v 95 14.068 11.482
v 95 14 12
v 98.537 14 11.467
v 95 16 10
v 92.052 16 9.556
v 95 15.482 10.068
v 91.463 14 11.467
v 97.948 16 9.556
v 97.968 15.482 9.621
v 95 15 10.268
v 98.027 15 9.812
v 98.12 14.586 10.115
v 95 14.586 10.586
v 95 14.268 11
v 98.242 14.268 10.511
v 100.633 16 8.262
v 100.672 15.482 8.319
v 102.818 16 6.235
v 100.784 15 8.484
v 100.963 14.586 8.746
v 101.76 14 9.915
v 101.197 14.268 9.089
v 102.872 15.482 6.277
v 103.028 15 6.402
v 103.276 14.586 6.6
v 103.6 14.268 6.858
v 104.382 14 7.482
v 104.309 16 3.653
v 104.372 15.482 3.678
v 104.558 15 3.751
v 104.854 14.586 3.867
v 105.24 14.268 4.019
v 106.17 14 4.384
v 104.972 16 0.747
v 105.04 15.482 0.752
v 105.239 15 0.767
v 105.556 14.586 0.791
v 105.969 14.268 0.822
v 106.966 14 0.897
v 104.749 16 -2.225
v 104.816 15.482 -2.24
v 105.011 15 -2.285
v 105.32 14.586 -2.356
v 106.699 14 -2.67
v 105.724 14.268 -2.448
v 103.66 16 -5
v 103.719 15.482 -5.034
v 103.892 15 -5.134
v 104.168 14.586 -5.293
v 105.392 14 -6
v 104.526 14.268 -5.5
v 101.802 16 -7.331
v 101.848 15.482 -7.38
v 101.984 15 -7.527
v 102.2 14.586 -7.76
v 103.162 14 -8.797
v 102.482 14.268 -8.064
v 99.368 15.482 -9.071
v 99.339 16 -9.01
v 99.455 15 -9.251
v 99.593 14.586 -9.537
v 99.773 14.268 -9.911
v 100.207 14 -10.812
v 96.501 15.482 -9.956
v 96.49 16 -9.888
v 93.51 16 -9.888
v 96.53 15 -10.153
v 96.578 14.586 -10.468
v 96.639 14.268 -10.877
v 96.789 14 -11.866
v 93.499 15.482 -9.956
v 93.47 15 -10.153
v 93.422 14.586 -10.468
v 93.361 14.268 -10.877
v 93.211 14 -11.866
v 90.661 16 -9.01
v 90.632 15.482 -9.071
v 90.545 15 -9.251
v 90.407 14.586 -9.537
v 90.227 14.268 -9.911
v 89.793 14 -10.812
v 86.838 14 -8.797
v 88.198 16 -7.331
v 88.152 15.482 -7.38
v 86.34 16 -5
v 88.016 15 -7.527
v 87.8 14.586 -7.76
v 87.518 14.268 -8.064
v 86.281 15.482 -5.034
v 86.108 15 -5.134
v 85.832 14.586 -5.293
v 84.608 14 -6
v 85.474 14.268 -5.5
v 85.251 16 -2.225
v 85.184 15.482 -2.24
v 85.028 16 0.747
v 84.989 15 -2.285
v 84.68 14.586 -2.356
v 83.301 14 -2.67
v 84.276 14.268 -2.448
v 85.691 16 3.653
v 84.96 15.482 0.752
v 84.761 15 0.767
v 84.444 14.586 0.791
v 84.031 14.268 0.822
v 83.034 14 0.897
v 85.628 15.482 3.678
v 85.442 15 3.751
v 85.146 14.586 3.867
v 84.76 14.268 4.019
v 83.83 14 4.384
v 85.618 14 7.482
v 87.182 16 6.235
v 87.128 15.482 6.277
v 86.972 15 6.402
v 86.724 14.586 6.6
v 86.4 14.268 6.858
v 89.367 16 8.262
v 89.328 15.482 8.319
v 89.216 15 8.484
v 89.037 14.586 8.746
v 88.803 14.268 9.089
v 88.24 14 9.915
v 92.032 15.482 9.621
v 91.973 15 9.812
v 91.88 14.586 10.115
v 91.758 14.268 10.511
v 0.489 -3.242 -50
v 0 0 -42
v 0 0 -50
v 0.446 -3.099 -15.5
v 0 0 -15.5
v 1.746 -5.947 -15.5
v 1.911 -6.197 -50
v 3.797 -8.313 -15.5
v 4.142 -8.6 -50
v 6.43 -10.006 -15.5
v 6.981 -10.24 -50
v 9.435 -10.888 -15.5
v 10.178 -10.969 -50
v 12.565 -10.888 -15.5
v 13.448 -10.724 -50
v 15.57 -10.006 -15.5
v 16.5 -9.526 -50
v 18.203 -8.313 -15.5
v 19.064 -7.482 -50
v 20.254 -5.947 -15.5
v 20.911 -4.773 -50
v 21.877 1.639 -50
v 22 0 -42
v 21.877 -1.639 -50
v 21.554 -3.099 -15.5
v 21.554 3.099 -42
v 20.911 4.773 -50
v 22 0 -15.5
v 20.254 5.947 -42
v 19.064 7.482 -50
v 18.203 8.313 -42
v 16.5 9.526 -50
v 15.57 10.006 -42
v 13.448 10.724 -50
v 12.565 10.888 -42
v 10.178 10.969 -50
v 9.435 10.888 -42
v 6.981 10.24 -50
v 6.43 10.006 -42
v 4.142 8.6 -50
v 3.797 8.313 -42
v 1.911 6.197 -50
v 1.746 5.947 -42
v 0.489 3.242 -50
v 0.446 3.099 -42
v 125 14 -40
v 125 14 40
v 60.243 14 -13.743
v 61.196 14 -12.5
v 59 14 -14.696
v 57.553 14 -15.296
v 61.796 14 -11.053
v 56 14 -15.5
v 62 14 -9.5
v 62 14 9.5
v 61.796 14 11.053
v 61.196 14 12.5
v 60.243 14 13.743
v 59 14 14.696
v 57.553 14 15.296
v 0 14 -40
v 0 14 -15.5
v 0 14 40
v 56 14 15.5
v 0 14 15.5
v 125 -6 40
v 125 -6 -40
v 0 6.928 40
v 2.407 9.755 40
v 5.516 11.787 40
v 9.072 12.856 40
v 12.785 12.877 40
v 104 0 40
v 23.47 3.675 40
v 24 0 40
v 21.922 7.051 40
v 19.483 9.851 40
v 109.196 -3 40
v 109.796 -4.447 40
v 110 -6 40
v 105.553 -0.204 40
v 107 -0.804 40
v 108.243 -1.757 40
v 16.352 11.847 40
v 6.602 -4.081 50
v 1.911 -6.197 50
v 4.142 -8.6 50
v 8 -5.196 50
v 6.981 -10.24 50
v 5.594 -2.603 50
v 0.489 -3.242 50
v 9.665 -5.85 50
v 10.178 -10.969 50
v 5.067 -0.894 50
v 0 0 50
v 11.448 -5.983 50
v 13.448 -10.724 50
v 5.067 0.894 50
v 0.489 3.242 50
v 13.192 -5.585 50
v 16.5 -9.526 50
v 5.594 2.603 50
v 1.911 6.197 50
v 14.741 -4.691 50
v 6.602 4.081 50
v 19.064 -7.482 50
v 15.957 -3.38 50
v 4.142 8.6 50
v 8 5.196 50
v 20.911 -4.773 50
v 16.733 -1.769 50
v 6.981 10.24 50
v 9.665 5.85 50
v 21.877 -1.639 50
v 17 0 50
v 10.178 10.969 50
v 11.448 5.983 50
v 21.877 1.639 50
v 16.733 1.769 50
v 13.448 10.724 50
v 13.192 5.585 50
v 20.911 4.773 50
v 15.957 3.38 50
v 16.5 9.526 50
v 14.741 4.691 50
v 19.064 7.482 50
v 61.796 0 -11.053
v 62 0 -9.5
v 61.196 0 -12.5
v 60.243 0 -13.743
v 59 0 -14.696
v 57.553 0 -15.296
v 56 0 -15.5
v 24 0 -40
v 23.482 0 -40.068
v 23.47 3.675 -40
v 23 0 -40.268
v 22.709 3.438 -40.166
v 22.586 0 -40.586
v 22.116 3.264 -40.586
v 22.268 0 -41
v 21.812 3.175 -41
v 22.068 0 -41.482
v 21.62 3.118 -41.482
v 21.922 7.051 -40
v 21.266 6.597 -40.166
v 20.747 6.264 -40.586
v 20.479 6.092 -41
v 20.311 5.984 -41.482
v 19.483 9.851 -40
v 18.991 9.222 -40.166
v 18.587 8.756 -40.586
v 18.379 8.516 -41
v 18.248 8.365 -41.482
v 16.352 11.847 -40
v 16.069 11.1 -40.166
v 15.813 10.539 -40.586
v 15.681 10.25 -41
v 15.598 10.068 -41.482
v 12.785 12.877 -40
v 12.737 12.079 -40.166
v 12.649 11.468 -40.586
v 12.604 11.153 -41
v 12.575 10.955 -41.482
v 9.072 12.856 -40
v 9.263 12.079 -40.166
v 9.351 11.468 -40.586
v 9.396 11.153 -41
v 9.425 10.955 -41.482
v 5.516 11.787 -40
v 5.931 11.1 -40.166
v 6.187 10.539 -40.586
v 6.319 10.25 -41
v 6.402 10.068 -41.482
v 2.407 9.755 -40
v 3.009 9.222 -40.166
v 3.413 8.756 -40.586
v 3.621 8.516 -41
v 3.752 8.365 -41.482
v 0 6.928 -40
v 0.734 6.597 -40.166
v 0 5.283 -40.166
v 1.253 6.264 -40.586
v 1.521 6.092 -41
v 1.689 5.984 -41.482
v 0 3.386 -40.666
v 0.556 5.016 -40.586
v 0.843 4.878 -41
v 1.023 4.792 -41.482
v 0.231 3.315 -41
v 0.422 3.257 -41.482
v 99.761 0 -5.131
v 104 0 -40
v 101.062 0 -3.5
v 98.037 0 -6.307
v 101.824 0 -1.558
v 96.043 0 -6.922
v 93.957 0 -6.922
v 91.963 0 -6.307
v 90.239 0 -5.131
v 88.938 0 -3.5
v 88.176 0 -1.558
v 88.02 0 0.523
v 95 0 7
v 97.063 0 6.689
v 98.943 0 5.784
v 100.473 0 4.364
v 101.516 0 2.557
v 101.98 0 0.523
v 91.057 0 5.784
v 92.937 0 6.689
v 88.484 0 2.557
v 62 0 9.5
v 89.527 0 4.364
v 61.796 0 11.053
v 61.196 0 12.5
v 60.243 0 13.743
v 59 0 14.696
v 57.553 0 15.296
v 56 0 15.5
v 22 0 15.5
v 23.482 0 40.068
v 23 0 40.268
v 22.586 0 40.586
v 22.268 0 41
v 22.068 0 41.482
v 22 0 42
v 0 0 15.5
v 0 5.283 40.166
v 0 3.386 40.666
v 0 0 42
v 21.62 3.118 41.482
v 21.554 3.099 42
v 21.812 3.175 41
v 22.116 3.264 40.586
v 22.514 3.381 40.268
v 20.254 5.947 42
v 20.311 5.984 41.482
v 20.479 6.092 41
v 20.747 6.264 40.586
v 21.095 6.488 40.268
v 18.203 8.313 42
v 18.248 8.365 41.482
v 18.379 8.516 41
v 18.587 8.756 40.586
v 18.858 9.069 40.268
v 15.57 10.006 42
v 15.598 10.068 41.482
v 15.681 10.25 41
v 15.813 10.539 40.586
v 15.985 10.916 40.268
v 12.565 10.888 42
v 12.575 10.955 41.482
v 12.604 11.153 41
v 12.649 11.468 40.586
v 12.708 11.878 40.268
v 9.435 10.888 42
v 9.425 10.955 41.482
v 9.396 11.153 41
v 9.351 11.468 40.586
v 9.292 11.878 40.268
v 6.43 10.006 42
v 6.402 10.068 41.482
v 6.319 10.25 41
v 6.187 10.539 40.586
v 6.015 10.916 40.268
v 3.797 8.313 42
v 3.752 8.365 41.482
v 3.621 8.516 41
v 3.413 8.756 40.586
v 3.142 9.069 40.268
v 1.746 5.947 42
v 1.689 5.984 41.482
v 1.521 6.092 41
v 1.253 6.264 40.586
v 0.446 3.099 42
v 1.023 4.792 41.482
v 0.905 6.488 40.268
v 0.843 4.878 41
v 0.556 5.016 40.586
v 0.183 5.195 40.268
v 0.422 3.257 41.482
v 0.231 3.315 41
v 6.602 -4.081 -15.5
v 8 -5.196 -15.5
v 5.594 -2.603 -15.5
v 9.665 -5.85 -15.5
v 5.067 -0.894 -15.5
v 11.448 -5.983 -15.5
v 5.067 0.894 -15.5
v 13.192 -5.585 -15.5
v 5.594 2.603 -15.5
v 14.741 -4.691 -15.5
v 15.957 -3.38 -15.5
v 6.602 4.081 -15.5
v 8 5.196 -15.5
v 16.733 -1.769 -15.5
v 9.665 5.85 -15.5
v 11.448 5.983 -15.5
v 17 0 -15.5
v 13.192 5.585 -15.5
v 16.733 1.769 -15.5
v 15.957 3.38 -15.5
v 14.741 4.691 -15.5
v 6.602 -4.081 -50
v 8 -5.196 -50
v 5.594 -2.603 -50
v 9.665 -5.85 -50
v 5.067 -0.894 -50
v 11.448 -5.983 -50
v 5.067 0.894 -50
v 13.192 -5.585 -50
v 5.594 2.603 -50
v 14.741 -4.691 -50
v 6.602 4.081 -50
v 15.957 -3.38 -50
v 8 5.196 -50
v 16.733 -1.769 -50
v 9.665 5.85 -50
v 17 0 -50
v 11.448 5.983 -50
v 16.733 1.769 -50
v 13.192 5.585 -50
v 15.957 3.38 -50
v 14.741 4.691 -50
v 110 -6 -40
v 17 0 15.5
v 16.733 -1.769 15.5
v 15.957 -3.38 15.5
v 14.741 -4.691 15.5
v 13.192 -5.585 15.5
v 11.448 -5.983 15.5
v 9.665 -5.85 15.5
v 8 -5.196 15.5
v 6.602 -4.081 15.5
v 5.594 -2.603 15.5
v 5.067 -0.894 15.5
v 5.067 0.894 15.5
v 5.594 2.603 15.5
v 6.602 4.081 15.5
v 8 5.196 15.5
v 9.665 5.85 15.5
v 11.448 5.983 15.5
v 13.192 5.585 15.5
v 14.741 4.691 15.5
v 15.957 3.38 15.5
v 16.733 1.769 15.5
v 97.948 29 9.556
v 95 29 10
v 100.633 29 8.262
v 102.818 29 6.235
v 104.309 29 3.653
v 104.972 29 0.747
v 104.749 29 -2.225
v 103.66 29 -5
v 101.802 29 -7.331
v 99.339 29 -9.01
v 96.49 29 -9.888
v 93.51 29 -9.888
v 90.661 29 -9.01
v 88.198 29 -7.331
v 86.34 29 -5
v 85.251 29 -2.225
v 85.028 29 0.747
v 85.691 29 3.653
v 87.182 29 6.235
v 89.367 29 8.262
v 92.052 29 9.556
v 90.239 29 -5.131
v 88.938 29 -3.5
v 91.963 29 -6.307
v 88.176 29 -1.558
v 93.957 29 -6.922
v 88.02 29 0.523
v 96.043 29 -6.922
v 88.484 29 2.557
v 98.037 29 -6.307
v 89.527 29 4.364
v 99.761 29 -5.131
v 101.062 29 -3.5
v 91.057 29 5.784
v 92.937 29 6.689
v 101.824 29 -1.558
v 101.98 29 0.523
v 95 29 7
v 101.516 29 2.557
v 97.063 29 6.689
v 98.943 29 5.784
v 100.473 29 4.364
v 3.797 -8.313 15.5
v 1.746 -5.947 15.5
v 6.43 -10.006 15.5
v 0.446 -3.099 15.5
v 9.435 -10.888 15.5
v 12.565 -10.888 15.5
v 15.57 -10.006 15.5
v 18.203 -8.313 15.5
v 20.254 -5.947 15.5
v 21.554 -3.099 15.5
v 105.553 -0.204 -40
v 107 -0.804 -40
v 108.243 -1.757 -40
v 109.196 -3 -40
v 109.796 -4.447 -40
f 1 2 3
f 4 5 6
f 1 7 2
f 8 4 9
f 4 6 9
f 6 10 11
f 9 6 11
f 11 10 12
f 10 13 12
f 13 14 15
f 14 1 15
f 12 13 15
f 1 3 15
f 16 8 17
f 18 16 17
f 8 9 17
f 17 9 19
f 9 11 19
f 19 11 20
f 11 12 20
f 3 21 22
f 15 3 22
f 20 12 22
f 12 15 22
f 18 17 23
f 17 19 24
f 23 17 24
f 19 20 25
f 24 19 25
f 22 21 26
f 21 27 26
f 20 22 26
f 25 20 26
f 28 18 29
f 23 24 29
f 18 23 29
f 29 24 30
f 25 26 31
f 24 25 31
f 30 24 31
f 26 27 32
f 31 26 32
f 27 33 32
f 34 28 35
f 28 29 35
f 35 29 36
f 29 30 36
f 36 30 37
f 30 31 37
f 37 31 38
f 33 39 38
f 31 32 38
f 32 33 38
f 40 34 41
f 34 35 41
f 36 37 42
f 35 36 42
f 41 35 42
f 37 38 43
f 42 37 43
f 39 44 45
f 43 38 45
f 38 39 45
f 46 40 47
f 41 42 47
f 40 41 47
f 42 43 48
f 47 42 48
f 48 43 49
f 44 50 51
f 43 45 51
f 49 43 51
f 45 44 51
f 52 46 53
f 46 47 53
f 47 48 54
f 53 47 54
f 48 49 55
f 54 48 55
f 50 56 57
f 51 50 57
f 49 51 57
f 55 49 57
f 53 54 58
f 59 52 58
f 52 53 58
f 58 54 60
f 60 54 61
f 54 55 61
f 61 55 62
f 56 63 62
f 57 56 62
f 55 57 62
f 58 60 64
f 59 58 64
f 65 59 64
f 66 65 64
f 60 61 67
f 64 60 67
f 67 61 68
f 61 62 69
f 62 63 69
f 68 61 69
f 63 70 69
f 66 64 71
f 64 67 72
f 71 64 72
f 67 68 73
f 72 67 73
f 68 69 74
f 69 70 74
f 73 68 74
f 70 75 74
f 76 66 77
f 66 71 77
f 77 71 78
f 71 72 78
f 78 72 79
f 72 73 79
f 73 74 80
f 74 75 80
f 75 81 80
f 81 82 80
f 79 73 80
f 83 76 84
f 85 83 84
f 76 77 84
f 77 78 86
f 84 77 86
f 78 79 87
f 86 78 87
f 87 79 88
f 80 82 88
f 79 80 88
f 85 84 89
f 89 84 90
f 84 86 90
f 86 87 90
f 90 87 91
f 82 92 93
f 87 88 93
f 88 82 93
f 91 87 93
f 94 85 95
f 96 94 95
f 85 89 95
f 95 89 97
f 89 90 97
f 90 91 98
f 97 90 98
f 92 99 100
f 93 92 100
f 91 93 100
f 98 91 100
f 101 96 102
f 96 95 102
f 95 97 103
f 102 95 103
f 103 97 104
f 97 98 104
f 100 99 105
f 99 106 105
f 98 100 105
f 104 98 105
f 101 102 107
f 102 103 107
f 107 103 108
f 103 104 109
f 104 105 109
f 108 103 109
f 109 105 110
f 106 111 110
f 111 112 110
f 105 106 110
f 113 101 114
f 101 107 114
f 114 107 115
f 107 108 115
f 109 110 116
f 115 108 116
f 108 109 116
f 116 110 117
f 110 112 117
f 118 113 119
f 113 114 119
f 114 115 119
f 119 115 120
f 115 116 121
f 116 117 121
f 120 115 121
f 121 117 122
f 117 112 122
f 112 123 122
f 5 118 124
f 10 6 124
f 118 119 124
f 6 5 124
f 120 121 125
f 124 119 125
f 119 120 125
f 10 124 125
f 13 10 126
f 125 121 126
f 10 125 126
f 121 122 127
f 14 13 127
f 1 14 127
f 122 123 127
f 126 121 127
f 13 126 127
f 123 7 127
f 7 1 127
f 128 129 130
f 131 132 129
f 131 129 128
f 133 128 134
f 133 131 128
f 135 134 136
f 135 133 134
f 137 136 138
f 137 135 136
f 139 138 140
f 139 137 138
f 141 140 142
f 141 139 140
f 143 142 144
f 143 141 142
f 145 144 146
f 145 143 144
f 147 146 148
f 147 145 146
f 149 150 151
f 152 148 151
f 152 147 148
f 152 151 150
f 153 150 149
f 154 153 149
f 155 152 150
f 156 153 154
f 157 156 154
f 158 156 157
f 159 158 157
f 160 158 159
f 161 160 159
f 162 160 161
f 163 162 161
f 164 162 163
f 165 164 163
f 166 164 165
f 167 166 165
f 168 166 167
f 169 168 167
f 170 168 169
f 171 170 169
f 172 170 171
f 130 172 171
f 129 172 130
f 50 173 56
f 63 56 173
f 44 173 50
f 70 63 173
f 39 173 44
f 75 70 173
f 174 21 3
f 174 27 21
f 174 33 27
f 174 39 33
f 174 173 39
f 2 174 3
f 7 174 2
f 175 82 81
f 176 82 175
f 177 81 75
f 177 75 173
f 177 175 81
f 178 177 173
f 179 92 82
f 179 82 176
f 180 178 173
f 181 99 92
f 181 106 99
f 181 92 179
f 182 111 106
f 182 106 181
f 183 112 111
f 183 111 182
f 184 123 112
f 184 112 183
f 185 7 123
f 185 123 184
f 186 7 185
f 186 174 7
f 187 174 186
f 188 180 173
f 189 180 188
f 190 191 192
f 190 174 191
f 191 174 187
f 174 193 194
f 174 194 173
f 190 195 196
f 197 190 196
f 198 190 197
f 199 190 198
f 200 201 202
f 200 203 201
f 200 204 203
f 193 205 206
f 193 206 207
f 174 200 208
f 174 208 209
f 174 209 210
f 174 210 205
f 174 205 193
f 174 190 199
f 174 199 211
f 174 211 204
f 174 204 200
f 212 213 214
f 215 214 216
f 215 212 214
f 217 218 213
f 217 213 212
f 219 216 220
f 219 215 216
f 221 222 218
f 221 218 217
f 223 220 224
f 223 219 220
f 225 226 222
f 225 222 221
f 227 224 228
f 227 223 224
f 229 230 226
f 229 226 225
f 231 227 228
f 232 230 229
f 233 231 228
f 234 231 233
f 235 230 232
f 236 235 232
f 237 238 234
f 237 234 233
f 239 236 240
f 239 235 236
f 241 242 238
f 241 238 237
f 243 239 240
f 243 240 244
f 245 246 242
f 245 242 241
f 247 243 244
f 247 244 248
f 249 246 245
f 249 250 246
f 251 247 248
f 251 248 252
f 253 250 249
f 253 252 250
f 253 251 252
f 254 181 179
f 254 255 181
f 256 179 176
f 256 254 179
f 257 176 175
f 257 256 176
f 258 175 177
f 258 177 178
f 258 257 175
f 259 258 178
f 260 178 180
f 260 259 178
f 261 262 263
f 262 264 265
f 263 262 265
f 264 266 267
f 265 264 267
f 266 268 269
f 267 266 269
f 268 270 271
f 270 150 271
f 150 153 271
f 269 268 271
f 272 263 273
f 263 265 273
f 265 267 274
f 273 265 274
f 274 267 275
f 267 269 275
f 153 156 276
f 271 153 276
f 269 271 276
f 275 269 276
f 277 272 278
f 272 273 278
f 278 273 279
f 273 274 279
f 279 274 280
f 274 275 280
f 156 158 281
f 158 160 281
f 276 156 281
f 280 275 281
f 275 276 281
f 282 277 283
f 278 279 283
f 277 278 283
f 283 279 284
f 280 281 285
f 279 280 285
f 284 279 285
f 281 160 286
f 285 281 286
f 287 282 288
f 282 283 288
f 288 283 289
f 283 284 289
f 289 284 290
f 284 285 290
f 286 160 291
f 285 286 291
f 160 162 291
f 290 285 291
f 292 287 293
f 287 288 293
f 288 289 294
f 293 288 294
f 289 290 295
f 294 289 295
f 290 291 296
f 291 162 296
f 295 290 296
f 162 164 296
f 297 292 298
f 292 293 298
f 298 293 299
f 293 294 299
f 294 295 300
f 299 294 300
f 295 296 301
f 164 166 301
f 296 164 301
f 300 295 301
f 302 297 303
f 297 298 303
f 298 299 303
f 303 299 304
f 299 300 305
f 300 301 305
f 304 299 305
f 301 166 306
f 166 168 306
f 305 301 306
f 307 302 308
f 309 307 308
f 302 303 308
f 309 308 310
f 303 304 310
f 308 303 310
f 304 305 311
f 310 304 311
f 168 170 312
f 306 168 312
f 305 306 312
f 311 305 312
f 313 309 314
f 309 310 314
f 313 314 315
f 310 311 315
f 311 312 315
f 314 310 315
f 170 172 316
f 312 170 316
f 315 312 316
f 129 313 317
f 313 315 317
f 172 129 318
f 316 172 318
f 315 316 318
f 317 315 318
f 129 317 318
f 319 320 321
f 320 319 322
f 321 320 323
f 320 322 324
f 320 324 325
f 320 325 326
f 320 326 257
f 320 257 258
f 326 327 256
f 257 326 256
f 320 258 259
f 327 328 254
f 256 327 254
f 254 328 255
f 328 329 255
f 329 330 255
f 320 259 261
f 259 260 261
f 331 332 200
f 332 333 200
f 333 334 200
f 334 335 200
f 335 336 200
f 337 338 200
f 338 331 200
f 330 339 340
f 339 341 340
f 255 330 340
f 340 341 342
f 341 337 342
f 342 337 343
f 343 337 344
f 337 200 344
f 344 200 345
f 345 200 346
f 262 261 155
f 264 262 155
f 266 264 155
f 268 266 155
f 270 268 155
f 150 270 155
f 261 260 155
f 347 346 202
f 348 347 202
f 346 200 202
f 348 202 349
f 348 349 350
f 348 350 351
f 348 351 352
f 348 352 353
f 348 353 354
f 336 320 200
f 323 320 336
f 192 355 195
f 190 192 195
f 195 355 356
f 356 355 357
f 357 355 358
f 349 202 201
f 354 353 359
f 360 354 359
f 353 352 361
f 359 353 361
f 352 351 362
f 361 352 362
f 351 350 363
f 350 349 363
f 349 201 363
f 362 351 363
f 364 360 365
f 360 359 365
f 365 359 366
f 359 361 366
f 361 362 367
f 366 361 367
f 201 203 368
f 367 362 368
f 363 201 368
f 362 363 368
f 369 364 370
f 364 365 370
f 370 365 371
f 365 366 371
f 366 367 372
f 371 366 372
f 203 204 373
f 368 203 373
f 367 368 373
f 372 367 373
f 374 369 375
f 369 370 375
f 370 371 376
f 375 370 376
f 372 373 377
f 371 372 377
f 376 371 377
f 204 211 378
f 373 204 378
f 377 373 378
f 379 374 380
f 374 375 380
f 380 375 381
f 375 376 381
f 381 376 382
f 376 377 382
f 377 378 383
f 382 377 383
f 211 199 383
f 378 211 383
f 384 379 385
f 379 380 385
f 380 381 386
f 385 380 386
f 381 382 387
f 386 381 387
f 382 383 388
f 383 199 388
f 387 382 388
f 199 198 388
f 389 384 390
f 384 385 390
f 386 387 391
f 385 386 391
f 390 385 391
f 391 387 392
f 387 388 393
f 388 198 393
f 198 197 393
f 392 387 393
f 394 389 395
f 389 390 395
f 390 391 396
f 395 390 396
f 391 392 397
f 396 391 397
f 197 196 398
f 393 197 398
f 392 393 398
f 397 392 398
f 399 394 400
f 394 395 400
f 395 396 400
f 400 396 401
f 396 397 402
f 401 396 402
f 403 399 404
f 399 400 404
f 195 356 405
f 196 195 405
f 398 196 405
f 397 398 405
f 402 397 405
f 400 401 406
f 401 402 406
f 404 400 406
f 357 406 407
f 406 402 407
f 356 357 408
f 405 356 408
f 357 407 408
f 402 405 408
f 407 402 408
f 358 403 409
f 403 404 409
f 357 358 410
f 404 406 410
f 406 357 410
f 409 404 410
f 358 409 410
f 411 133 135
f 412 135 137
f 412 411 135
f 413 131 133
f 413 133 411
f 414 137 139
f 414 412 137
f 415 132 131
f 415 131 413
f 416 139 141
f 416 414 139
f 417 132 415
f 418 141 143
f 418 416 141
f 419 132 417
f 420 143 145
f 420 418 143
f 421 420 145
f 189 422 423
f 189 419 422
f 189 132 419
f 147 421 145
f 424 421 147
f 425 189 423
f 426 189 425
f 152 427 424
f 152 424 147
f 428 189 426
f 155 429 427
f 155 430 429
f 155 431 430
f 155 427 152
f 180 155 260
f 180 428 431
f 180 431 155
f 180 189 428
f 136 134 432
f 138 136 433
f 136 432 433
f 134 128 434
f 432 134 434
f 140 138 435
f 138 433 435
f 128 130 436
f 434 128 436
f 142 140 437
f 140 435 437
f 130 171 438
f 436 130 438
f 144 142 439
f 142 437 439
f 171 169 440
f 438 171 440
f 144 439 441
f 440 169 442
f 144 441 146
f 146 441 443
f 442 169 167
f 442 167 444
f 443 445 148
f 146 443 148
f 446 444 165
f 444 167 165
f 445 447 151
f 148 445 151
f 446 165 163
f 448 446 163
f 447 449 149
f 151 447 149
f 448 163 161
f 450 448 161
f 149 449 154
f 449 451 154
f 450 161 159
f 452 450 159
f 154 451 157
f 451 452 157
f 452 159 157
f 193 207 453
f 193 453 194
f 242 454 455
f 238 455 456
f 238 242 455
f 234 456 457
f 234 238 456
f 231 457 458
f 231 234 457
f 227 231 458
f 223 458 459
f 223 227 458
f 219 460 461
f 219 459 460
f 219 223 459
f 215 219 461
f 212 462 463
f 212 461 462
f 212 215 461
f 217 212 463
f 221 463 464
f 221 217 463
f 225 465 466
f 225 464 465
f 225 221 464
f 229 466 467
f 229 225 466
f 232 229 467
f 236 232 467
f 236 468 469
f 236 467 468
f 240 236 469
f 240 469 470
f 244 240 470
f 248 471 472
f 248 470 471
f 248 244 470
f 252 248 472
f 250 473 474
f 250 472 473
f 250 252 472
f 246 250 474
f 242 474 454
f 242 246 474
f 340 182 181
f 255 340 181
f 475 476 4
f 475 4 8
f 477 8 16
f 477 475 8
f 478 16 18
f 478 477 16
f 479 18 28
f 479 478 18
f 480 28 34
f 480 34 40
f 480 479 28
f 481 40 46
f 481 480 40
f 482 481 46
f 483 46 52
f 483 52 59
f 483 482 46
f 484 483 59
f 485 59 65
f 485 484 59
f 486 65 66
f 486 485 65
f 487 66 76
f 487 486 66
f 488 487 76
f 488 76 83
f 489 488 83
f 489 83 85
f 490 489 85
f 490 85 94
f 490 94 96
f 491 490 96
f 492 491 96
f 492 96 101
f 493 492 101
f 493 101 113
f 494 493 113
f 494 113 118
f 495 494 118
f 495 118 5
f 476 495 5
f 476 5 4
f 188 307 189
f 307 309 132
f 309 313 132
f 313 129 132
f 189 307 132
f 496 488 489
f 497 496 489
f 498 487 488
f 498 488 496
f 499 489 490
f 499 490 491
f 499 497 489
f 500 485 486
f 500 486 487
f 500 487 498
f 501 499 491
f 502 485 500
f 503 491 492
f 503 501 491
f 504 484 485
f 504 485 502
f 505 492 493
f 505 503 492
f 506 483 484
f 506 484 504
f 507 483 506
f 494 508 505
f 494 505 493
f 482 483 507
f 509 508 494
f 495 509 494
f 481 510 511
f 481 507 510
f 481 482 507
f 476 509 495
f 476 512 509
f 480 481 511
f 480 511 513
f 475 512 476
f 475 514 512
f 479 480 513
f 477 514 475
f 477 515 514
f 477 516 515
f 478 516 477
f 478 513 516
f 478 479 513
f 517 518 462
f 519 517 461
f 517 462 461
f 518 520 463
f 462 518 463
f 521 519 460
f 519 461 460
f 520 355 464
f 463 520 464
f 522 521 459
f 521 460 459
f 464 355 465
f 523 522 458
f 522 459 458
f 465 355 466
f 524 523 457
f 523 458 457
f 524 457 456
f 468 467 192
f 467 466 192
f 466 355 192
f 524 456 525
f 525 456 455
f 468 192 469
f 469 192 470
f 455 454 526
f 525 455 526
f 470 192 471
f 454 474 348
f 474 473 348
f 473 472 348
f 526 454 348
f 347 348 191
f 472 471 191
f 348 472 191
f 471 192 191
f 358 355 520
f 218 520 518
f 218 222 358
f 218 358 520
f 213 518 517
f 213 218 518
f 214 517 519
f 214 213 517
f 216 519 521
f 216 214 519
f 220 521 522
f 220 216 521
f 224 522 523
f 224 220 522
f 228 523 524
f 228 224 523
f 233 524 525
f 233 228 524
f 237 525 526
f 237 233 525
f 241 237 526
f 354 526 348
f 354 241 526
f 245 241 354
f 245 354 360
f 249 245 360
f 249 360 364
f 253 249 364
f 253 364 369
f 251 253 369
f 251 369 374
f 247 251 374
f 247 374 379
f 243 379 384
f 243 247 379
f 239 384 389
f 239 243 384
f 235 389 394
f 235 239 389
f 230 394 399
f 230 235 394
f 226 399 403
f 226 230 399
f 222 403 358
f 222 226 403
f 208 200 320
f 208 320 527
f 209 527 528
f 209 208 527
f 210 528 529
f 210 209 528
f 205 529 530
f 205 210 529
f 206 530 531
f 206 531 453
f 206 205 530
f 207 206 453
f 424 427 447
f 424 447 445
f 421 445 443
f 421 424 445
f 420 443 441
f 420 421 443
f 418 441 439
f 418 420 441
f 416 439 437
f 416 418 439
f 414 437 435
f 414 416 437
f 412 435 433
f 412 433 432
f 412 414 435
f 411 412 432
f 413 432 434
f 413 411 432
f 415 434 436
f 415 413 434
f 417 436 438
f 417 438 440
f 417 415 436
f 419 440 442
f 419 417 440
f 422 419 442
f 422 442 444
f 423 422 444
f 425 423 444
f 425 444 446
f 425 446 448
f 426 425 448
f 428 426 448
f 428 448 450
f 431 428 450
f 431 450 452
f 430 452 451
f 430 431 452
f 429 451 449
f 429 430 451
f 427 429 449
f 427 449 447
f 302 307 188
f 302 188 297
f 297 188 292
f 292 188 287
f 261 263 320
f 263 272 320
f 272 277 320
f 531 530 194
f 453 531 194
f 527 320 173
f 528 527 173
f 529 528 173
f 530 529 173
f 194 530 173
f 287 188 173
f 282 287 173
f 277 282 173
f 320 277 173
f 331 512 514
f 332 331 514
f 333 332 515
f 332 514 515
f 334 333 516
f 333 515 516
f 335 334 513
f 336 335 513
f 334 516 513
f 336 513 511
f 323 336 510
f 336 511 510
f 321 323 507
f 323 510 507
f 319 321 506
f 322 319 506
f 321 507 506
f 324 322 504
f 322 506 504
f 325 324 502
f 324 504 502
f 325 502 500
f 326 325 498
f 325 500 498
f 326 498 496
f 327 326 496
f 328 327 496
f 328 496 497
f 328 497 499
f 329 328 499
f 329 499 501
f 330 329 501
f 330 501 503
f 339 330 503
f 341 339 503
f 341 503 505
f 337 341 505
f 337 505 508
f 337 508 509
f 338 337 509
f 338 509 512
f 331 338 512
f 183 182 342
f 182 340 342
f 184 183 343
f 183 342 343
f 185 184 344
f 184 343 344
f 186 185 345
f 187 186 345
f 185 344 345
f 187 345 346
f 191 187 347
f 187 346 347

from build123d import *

# Parameters (mm, degrees)
SKETCH1_R           = 6
BOSS_EXTRUDE1_DEPTH = 40
BOSS_EXTRUDE2_DEPTH = 50
SKETCH2_W           = 62
SKETCH2_H           = 31
CUT_EXTRUDE1_DEPTH  = 137.930639376
SKETCH3_R           = 7
CUT_EXTRUDE2_DEPTH  = 137.930639376
BOSS_EXTRUDE3_START = 15
SKETCH3_3_R         = 10
SKETCH3_3_R_2       = 7
BOSS_EXTRUDE3_DEPTH = 15
FILLET1_R           = 6
FILLET2_R           = 2


with BuildPart() as part:
    # Sketch1 → Boss-Extrude1 (new, symmetric)
    with BuildSketch(Plane.XY):
        with BuildLine():
            Line((22, 0), (104, 0))
            ThreePointArc((104, 0), (108.242640687, -1.757359313), (110, -6))
            Line((110, -6), (125, -6))
            Line((125, -6), (125, 14))
            Line((125, 14), (0, 14))
            Line((0, 14), (0, 0))
            ThreePointArc((0, 0), (11, -11), (22, 0))
        make_face()
        with Locations((11, 0)):
            Circle(SKETCH1_R, mode=Mode.SUBTRACT)
    extrude(amount=BOSS_EXTRUDE1_DEPTH, both=True)

    # Sketch1<3> → Boss-Extrude2 (add, symmetric)
    with BuildSketch(Plane.XY):
        with BuildLine():
            ThreePointArc((22, 0), (11, 11), (0, 0))
            Line((0, 0), (5, 0))
            ThreePointArc((5, 0), (11, 6), (17, 0))
            Line((17, 0), (22, 0))
        make_face()
        with BuildLine():
            Line((5, 0), (0, 0))
            ThreePointArc((0, 0), (11, -11), (22, 0))
            Line((22, 0), (17, 0))
            ThreePointArc((17, 0), (11, -6), (5, 0))
        make_face()
    extrude(amount=BOSS_EXTRUDE2_DEPTH, both=True)

    # Sketch2 → Cut-Extrude1 (cut, through all)
    with BuildSketch(Plane(origin=(0, 14, 0), x_dir=(1, 0, 0), z_dir=(0, 1, 0))):
        with Locations((31, 0)):
            Rectangle(SKETCH2_W, SKETCH2_H)
    extrude(amount=-CUT_EXTRUDE1_DEPTH, mode=Mode.SUBTRACT)

    # Sketch3 → Cut-Extrude2 (cut, through all)
    with BuildSketch(Plane(origin=(0, 14, 0), x_dir=(1, 0, 0), z_dir=(0, 1, 0))):
        with Locations(Location((95, 0, 0), (0, 0, 270))):
            Circle(SKETCH3_R)
    extrude(amount=-CUT_EXTRUDE2_DEPTH, mode=Mode.SUBTRACT)

    # Sketch3<3> → Boss-Extrude3 (add)
    with BuildSketch(Plane(origin=(0, 14, 0), x_dir=(1, 0, 0), z_dir=(0, 1, 0)).offset(BOSS_EXTRUDE3_START)):
        with Locations(Location((95, 0, 0), (0, 0, 270))):
            Circle(SKETCH3_3_R)
        with Locations(Location((95, 0, 0), (0, 0, 270))):
            Circle(SKETCH3_3_R_2, mode=Mode.SUBTRACT)
    extrude(amount=-BOSS_EXTRUDE3_DEPTH)

    # Fillet1
    fillet1_edges = [part.edges().sort_by_distance(p)[0] for p in [
        (62, 7, 15.5),
        (62, 7, -15.5),
    ]]
    fillet(fillet1_edges, radius=FILLET1_R)

    # Fillet2
    # the kernel refuses this fillet: 2 mm, written as the material it adds along each edge
    with BuildSketch(Plane(origin=(11, 0, -40), x_dir=(1, 0, 0), z_dir=(0, -1, 0))) as fillet2_piece_1_section:
        with BuildLine():
            CenterArc((11 + FILLET2_R, -FILLET2_R), FILLET2_R, 90, 90)
            Line((11 + FILLET2_R, 0), (11, 0))
            Line((11, 0), (11, -FILLET2_R))
        make_face()
    fillet2_piece_1 = revolve(axis=Axis((11, 0, -40), (0, 0, 1)), revolution_arc=180, mode=Mode.PRIVATE)
    fillet2_piece_1 = split(fillet2_piece_1, bisect_by=Plane(origin=(0, 11.564222142, -40.564222142), z_dir=(1, 0, 0)), keep=Keep.TOP, mode=Mode.PRIVATE)
    add(fillet2_piece_1)
    with BuildSketch(Plane(origin=(11, 0, 40), x_dir=(1, 0, 0), z_dir=(0, -1, 0))) as fillet2_piece_2_section:
        with BuildLine():
            CenterArc((11 + FILLET2_R, FILLET2_R), FILLET2_R, 180, 90)
            Line((11, FILLET2_R), (11, 0))
            Line((11, 0), (11 + FILLET2_R, 0))
        make_face()
    fillet2_piece_2 = revolve(axis=Axis((11, 0, 40), (0, 0, 1)), revolution_arc=180, mode=Mode.PRIVATE)
    fillet2_piece_2 = split(fillet2_piece_2, bisect_by=Plane(origin=(0, 11.564222139, 40.564222139), z_dir=(1, 0, 0)), keep=Keep.TOP, mode=Mode.PRIVATE)
    add(fillet2_piece_2)
    with BuildSketch(Plane(origin=(95, 14, 0), x_dir=(0, 0, 1), z_dir=(-1, 0, 0))) as fillet2_piece_3:
        with BuildLine():
            CenterArc((10 + FILLET2_R, FILLET2_R), FILLET2_R, 180, 90)
            Line((10, FILLET2_R), (10, 0))
            Line((10, 0), (10 + FILLET2_R, 0))
        make_face()
    revolve(axis=Axis((95, 14, 0), (0, 1, 0)))


solid = part.part
